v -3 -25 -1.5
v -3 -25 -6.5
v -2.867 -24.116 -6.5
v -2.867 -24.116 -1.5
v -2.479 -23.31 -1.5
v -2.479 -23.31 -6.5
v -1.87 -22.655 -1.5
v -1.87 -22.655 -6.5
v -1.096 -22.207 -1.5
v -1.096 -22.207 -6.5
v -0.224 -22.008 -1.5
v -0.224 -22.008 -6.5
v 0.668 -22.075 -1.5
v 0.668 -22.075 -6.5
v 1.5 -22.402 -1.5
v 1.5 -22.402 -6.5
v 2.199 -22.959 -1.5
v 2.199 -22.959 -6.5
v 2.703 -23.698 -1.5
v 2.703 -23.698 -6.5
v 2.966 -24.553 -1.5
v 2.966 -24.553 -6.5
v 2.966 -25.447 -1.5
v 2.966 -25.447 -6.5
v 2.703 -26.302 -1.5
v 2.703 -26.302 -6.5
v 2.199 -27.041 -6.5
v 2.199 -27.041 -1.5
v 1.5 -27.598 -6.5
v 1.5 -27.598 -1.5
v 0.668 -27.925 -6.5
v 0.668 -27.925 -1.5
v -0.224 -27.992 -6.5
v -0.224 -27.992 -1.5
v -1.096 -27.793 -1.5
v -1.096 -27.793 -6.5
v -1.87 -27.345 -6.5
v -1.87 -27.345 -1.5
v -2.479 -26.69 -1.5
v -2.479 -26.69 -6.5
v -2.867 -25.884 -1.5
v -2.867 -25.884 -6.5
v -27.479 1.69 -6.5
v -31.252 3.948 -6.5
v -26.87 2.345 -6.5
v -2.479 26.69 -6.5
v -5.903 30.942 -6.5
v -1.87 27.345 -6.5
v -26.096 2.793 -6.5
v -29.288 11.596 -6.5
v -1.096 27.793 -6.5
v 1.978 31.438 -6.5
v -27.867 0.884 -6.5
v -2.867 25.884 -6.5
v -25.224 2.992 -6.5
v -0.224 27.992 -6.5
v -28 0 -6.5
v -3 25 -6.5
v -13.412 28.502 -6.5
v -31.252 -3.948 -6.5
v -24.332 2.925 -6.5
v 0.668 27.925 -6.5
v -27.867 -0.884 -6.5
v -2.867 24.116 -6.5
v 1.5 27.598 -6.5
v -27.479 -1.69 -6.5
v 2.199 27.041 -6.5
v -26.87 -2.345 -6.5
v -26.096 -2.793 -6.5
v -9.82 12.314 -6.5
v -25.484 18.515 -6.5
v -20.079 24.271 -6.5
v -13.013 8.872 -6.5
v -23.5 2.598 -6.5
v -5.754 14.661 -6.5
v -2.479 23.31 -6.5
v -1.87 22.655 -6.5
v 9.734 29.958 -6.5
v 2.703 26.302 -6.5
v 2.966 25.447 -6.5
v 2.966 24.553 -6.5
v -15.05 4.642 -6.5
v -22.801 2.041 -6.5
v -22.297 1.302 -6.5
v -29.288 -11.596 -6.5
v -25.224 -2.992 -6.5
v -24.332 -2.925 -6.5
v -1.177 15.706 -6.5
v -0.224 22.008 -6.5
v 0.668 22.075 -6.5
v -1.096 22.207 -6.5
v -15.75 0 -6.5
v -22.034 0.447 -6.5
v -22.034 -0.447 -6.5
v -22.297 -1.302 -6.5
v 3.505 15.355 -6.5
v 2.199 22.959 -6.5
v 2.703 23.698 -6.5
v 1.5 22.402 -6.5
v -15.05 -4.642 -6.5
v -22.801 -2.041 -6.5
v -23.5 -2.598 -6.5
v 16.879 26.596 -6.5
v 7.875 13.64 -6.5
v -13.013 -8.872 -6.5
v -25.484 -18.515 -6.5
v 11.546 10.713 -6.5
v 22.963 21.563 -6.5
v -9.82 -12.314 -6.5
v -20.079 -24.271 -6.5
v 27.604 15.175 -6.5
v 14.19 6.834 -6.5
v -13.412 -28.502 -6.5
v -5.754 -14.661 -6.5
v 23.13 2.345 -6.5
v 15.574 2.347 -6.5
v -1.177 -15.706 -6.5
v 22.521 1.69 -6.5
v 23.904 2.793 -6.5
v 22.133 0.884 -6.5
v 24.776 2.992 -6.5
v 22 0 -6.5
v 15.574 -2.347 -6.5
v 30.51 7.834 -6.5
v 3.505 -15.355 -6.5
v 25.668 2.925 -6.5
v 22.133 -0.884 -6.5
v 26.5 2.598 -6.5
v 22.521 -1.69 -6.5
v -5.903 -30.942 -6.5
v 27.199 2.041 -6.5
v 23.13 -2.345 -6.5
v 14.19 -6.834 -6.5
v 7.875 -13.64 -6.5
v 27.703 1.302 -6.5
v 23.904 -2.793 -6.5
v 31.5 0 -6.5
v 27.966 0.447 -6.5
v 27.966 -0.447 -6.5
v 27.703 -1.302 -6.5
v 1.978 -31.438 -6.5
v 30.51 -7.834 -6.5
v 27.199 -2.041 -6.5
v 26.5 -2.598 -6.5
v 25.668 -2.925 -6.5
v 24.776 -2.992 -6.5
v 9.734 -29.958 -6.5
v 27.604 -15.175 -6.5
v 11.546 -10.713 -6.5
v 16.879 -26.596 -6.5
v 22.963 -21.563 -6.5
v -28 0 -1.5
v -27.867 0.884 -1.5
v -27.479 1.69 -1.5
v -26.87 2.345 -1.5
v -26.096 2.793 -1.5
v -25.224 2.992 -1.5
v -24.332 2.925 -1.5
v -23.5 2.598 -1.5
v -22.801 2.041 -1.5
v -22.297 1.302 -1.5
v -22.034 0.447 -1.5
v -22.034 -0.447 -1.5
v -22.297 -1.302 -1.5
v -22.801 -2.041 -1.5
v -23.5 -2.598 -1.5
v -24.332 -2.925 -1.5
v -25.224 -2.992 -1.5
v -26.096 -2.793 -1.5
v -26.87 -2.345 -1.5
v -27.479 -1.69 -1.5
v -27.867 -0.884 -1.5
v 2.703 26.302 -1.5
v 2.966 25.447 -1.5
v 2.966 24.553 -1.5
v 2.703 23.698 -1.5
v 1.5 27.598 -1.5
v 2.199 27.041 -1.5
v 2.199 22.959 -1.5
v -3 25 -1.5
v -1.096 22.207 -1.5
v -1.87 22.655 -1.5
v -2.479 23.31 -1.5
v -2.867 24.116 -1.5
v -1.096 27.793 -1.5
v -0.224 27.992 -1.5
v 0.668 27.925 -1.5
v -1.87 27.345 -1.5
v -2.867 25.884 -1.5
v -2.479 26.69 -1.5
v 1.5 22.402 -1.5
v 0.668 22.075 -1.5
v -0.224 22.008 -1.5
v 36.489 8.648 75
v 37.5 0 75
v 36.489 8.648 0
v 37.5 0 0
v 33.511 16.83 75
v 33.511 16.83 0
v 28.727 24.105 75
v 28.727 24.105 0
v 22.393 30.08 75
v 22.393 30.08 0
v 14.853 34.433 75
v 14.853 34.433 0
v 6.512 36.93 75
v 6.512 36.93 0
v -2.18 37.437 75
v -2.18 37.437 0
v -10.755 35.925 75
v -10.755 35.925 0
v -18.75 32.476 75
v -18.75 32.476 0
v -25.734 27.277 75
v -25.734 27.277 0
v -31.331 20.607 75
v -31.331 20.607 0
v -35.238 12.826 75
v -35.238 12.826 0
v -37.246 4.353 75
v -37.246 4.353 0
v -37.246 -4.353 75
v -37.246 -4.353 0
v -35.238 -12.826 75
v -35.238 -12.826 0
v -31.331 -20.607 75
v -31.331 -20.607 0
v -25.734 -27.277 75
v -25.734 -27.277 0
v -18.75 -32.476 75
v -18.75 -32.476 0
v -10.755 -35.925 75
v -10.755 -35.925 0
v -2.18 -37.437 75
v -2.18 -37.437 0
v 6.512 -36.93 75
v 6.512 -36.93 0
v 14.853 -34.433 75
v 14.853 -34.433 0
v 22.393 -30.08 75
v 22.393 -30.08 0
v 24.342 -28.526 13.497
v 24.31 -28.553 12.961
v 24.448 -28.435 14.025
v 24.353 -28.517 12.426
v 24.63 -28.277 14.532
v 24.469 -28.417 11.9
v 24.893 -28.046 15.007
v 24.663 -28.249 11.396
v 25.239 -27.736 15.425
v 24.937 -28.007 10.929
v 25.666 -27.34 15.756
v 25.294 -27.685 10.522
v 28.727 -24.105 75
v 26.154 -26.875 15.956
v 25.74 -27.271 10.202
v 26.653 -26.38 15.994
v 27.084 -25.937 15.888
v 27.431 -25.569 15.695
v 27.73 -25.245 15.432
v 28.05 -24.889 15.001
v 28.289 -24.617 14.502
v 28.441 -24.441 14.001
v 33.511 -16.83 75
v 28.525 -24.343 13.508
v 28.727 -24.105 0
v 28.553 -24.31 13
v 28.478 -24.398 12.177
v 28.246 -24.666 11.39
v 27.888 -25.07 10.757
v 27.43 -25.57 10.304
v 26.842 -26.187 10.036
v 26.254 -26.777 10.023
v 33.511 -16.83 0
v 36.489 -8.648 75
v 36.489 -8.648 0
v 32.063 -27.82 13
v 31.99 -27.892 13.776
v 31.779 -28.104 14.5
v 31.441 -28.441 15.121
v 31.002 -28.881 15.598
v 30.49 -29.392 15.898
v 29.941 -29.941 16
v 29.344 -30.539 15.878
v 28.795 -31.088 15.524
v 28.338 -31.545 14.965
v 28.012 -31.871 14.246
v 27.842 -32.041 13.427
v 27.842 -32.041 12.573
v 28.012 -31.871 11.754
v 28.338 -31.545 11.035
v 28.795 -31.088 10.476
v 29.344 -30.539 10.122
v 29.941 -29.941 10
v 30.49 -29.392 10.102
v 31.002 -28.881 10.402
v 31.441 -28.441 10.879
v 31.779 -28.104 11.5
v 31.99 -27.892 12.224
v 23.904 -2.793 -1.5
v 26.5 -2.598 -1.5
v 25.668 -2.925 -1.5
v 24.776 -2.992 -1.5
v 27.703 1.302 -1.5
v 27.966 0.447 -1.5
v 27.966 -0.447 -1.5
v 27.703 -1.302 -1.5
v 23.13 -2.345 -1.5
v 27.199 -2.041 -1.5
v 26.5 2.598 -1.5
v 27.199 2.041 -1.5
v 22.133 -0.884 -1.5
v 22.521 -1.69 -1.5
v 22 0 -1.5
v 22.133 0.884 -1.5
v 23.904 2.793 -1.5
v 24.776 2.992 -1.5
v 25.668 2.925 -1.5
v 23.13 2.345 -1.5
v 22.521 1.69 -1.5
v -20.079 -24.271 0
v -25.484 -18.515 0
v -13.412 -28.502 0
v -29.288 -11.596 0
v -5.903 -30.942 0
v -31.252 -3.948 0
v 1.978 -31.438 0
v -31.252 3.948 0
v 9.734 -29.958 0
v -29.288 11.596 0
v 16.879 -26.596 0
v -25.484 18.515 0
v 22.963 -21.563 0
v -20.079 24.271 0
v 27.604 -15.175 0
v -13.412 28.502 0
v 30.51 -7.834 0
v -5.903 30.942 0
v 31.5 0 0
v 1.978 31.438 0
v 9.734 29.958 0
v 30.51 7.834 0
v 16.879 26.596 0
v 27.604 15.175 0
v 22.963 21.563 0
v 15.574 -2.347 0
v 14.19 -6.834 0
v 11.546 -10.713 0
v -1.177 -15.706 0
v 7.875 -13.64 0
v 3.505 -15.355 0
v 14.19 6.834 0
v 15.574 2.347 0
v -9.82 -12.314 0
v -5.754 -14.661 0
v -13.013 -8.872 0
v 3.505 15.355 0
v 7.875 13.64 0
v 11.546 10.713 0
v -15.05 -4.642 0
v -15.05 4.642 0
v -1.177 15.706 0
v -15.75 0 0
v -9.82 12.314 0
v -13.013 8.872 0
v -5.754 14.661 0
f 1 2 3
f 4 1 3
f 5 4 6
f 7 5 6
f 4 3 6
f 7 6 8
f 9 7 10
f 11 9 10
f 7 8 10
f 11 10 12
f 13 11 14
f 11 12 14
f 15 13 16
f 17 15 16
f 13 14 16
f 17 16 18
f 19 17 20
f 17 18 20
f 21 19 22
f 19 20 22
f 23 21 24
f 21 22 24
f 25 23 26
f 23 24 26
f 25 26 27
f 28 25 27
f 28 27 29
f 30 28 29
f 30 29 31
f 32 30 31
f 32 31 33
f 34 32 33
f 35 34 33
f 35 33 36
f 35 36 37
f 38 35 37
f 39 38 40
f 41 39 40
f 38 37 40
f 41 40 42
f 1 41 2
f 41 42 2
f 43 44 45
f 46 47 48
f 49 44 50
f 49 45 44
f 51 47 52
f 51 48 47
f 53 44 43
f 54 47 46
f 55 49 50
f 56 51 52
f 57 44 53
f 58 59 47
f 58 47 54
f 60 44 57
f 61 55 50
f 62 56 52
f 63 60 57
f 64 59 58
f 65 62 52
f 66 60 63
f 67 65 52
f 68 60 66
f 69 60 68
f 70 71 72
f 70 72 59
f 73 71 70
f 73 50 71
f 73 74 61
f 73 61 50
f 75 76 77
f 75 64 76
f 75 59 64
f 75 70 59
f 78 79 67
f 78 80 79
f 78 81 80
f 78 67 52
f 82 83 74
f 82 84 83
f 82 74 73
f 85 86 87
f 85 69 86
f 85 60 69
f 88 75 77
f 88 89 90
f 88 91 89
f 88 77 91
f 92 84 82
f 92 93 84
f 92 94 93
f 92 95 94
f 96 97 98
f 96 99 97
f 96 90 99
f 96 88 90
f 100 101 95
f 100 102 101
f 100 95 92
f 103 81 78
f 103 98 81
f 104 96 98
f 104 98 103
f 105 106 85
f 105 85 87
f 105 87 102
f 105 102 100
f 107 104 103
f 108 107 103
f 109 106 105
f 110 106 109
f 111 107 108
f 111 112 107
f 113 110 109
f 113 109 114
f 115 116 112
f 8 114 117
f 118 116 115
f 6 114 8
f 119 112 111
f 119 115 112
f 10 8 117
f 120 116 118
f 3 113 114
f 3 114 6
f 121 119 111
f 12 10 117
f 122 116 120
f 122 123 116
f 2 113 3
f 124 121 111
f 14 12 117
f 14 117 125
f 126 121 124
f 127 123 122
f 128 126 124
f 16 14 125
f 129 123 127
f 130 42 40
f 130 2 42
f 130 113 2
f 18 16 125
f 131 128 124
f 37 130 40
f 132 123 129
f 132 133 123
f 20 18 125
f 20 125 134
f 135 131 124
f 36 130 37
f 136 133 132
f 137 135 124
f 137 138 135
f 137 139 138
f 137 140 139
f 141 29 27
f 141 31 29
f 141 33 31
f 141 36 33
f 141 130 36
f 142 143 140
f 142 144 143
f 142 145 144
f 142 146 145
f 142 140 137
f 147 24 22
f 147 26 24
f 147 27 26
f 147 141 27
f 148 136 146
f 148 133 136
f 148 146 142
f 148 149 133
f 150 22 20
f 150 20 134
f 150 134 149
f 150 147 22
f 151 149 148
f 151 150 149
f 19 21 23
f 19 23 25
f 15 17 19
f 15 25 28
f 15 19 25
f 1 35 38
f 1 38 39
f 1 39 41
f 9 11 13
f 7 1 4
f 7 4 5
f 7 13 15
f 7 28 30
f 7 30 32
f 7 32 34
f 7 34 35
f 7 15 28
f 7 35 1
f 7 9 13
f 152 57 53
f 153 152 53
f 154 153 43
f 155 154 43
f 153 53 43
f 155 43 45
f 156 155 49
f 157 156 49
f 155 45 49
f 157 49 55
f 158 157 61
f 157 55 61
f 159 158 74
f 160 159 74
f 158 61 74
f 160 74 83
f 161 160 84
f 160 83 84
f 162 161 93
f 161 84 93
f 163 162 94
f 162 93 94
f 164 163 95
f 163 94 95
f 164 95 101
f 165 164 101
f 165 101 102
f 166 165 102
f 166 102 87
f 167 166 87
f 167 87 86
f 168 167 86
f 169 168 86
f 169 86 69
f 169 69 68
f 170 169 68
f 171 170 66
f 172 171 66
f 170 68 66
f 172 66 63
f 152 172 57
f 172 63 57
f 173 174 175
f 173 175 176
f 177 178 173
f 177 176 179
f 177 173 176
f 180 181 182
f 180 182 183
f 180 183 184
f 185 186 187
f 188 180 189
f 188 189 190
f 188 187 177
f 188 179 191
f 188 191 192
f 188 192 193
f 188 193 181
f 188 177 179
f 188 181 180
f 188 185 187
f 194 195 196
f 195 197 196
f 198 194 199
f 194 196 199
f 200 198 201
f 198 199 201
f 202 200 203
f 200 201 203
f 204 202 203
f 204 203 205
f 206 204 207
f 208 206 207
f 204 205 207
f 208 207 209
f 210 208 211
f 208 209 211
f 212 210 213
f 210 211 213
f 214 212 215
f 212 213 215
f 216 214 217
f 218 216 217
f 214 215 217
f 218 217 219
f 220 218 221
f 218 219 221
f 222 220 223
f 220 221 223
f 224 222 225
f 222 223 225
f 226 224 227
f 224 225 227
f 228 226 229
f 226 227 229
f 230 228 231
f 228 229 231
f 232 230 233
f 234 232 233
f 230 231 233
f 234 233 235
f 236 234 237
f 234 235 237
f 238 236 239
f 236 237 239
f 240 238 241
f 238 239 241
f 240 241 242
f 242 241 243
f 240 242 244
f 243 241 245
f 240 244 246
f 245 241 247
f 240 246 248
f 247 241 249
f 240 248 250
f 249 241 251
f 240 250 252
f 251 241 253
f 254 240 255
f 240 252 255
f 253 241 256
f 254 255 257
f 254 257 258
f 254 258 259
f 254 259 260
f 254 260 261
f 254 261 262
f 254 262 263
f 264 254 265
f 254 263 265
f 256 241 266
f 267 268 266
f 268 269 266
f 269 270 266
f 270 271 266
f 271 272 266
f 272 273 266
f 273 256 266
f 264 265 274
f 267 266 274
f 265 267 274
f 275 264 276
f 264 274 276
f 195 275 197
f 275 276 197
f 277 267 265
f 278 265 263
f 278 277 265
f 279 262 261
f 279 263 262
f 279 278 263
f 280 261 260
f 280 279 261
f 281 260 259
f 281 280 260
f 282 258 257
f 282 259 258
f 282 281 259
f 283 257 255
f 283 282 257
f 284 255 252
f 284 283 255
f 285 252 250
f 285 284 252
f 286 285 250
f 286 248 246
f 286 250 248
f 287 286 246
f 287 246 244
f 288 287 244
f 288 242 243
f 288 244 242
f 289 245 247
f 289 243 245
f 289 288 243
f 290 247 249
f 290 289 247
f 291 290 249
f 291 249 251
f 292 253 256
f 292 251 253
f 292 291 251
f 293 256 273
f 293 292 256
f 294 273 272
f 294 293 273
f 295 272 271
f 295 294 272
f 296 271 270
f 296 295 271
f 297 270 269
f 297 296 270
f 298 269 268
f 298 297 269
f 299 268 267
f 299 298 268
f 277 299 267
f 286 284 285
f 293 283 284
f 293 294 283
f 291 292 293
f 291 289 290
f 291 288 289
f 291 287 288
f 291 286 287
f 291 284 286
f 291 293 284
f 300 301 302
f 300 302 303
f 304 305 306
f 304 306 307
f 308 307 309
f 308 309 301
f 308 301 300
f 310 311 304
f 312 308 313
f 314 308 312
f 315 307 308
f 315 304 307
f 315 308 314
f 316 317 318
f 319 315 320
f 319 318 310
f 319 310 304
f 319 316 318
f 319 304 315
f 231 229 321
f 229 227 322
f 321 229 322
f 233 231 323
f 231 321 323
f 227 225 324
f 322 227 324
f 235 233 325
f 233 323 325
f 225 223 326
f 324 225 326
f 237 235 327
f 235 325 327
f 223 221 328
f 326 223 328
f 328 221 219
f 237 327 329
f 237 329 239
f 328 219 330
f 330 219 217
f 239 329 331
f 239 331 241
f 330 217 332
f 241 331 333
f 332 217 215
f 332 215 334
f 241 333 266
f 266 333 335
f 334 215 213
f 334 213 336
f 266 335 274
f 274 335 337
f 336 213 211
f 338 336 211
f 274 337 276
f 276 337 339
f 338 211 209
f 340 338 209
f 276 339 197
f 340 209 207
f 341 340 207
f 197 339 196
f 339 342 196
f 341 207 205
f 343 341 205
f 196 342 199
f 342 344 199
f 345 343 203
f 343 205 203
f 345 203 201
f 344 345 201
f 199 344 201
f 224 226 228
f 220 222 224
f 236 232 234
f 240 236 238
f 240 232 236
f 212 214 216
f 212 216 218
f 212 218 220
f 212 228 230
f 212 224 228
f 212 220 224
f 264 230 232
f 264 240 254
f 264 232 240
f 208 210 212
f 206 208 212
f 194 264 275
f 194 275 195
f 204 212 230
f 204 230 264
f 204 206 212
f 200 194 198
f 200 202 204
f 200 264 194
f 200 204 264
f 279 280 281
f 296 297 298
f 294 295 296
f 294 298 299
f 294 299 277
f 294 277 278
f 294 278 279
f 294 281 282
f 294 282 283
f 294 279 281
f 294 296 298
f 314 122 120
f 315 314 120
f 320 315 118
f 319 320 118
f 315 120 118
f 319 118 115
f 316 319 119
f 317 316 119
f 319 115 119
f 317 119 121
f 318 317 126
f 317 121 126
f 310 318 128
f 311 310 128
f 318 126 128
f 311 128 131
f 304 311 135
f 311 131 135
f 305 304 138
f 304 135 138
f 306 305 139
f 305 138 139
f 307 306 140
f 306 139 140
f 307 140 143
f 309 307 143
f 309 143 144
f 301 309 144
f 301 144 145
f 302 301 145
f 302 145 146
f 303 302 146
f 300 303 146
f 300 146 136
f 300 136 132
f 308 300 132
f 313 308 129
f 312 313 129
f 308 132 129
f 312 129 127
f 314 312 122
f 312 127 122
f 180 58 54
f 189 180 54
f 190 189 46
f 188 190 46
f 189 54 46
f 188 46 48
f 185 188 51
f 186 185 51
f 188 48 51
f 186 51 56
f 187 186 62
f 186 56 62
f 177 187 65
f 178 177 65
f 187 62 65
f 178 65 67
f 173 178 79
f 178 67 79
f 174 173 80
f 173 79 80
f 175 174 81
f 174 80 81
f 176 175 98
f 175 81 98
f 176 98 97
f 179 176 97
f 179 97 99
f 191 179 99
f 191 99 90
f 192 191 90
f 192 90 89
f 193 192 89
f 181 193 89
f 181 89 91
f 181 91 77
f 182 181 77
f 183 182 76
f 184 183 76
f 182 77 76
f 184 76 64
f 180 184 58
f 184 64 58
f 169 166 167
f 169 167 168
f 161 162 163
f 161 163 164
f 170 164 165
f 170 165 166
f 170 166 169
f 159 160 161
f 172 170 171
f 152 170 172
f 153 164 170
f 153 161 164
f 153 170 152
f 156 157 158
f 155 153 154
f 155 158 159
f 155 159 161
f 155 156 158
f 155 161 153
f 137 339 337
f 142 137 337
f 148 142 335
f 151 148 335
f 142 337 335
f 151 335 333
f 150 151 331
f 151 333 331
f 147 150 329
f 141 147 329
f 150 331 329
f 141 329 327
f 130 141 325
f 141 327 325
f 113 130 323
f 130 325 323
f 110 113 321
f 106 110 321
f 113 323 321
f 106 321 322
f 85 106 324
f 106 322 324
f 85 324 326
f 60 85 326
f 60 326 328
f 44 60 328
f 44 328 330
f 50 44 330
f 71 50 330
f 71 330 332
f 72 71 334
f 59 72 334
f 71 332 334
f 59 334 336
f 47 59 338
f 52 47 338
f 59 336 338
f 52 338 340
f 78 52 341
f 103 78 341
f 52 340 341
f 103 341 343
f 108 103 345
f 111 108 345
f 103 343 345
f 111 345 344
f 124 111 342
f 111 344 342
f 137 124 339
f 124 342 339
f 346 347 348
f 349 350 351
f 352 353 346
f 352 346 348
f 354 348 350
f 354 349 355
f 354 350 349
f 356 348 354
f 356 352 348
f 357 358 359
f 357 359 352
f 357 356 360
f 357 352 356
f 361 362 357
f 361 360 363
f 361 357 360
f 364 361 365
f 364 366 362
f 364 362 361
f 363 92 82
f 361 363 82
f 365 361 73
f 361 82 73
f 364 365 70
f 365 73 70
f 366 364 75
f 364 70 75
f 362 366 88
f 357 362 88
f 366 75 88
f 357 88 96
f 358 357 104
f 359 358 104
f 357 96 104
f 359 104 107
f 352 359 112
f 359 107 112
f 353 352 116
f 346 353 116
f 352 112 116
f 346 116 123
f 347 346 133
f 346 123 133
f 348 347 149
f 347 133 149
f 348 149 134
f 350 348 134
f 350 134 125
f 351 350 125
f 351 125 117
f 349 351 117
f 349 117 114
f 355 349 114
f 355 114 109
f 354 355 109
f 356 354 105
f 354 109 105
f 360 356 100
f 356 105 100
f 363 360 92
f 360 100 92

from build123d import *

# Parameters (mm, degrees)
SKETCH1_R               = 37.5
BOSS_EXTRUDE1_DEPTH     = 75
SKETCH2_R               = 31.5
BOSS_EXTRUDE2_DEPTH     = 6.5
SKETCH3_R               = 15.75
CUT_EXTRUDE1_DEPTH      = 6.5
SKETCH4_R               = 3
CUT_EXTRUDE2_DEPTH      = 5
BOSS_EXTRUDE3_START     = -10
BOSS_EXTRUDE3_DEPTH     = 6
CUT_EXTRUDE4_REACH      = 123.333
CUT_EXTRUDE4_END_RADIUS = 37.5
SKETCH7_R               = 7.955992876
SKETCH7_R_2             = 3


with BuildPart() as part:
    # Sketch1 → Boss-Extrude1 (new body)
    with BuildSketch(Plane.XY):
        Circle(SKETCH1_R)
    extrude(amount=BOSS_EXTRUDE1_DEPTH)

    # Sketch2 → Boss-Extrude2 (add)
    with BuildSketch(Plane(origin=(0, 0, 0), x_dir=(-1, 0, 0), z_dir=(0, 0, -1))):
        with Locations(Location((0, 0, 0), (0, 0, 180))):
            Circle(SKETCH2_R)
    extrude(amount=BOSS_EXTRUDE2_DEPTH)

    # Sketch3 → Cut-Extrude1 (cut)
    with BuildSketch(Plane(origin=(0, 0, -6.5), x_dir=(-1, 0, 0), z_dir=(0, 0, -1))):
        Circle(SKETCH3_R)
    extrude(amount=-CUT_EXTRUDE1_DEPTH, mode=Mode.SUBTRACT)

    # Sketch4 → Cut-Extrude2 (cut)
    with BuildSketch(Plane(origin=(0, 0, -6.5), x_dir=(-1, 0, 0), z_dir=(0, 0, -1))):
        with Locations((25, 0)):
            Circle(SKETCH4_R)
        with Locations((0, -25)):
            Circle(SKETCH4_R)
        with Locations((-25, 0)):
            Circle(SKETCH4_R)
        with Locations((0, 25)):
            Circle(SKETCH4_R)
    extrude(amount=-CUT_EXTRUDE2_DEPTH, mode=Mode.SUBTRACT)

    # Sketch6 → Boss-Extrude3 (add)
    with BuildSketch(Plane(origin=(0, 0, 0), x_dir=(-1, 0, 0), z_dir=(0, 0, -1)).offset(BOSS_EXTRUDE3_START)):
        with BuildLine():
            ThreePointArc((-24.310194937, -28.552835624), (-25.433737437, -27.556759606), (-26.516504294, -26.516504294))
            Line((-26.516504294, -26.516504294), (-29.941404236, -29.941404236))
            Line((-29.941404236, -29.941404236), (-27.820083892, -32.062724579))
            Line((-27.820083892, -32.062724579), (-24.310194936, -28.552835624))
        make_face()
        with BuildLine():
            Line((-29.941404236, -29.941404236), (-26.516504294, -26.516504294))
            ThreePointArc((-26.516504294, -26.516504294), (-27.556759606, -25.433737437), (-28.552835624, -24.310194937))
            Line((-28.552835624, -24.310194936), (-32.062724579, -27.820083892))
            Line((-32.062724579, -27.820083892), (-29.941404236, -29.941404236))
        make_face()
    extrude(amount=-BOSS_EXTRUDE3_DEPTH)

    # Cut-Extrude4: up to this cylinder (the profile starts outside it)
    cut_extrude4_end = Plane(origin=(0, 0, 20.730963), z_dir=(0, 0, -1)) * Cylinder(CUT_EXTRUDE4_END_RADIUS, 322.666, mode=Mode.PRIVATE)
    # Sketch7 → Cut-Extrude4 (cut, up to the surface)
    with BuildSketch(Plane(origin=(29.941404236, -29.941404236, 0), x_dir=(0, 0, -1), z_dir=(0.7071067811865471, -0.7071067811865479, 0)), mode=Mode.PRIVATE) as cut_extrude4_sk1:
        with Locations((-13, 0)):
            Circle(SKETCH7_R)
        with Locations(Location((-13, 0, 0), (0, 0, 90))):
            Circle(SKETCH7_R_2, mode=Mode.SUBTRACT)
    cut_extrude4_tool1 = extrude(cut_extrude4_sk1.sketch, amount=-CUT_EXTRUDE4_REACH, mode=Mode.PRIVATE) - cut_extrude4_end
    add(cut_extrude4_tool1.solids().sort_by_distance((29.941404, -29.941404, 20.730963))[0], mode=Mode.SUBTRACT)


solid = part.part
